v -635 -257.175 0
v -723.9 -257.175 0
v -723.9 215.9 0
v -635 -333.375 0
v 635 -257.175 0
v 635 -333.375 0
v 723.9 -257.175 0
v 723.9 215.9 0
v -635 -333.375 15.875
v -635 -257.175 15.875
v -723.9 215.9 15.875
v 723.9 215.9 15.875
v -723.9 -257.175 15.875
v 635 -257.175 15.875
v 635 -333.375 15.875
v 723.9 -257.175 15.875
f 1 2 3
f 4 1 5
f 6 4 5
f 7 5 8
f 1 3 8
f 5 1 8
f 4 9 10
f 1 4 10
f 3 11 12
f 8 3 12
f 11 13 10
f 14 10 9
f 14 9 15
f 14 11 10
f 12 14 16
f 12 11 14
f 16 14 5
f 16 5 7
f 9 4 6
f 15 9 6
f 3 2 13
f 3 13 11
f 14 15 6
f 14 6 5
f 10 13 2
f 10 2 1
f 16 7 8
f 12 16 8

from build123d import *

# Parameters (mm, degrees)
F0_W     = 1447.8
F0_H     = 666.75
F1_DEPTH = 15.875
F2_W     = 88.9
F2_H     = 76.2
F3_DEPTH = 15.876
F4_W     = 1270
F4_H     = 76.2
F5_DEPTH = 15.876


with BuildPart() as f1:
    # F0 (on Top) → F1 (new body)
    with BuildSketch(Plane.XY):
        Rectangle(F0_W, F0_H)
    extrude(amount=F1_DEPTH)

    # F2 (on face) → F3 (cut, through all)
    with BuildSketch(Plane.XY.offset(15.875)):
        with Locations((-679.45, -295.275)):
            Rectangle(F2_W, F2_H)
        with Locations((-679.45, 295.275)):
            Rectangle(F2_W, F2_H)
        with Locations((679.45, 295.275)):
            Rectangle(F2_W, F2_H)
        with Locations((679.45, -295.275)):
            Rectangle(F2_W, F2_H)
    extrude(amount=-F3_DEPTH, mode=Mode.SUBTRACT)

    # F4 (on face) → F5 (cut, through all)
    with BuildSketch(Plane.XY.offset(15.875)):
        Polygon((-723.9, 257.175), (-723.9, 215.9), (723.9, 215.9), (723.9, 257.175), (635, 257.175), (-635, 257.175), align=None)
        with Locations((0, 295.275)):
            Rectangle(F4_W, F4_H)
    extrude(amount=-F5_DEPTH, mode=Mode.SUBTRACT)


solid = f1.part
